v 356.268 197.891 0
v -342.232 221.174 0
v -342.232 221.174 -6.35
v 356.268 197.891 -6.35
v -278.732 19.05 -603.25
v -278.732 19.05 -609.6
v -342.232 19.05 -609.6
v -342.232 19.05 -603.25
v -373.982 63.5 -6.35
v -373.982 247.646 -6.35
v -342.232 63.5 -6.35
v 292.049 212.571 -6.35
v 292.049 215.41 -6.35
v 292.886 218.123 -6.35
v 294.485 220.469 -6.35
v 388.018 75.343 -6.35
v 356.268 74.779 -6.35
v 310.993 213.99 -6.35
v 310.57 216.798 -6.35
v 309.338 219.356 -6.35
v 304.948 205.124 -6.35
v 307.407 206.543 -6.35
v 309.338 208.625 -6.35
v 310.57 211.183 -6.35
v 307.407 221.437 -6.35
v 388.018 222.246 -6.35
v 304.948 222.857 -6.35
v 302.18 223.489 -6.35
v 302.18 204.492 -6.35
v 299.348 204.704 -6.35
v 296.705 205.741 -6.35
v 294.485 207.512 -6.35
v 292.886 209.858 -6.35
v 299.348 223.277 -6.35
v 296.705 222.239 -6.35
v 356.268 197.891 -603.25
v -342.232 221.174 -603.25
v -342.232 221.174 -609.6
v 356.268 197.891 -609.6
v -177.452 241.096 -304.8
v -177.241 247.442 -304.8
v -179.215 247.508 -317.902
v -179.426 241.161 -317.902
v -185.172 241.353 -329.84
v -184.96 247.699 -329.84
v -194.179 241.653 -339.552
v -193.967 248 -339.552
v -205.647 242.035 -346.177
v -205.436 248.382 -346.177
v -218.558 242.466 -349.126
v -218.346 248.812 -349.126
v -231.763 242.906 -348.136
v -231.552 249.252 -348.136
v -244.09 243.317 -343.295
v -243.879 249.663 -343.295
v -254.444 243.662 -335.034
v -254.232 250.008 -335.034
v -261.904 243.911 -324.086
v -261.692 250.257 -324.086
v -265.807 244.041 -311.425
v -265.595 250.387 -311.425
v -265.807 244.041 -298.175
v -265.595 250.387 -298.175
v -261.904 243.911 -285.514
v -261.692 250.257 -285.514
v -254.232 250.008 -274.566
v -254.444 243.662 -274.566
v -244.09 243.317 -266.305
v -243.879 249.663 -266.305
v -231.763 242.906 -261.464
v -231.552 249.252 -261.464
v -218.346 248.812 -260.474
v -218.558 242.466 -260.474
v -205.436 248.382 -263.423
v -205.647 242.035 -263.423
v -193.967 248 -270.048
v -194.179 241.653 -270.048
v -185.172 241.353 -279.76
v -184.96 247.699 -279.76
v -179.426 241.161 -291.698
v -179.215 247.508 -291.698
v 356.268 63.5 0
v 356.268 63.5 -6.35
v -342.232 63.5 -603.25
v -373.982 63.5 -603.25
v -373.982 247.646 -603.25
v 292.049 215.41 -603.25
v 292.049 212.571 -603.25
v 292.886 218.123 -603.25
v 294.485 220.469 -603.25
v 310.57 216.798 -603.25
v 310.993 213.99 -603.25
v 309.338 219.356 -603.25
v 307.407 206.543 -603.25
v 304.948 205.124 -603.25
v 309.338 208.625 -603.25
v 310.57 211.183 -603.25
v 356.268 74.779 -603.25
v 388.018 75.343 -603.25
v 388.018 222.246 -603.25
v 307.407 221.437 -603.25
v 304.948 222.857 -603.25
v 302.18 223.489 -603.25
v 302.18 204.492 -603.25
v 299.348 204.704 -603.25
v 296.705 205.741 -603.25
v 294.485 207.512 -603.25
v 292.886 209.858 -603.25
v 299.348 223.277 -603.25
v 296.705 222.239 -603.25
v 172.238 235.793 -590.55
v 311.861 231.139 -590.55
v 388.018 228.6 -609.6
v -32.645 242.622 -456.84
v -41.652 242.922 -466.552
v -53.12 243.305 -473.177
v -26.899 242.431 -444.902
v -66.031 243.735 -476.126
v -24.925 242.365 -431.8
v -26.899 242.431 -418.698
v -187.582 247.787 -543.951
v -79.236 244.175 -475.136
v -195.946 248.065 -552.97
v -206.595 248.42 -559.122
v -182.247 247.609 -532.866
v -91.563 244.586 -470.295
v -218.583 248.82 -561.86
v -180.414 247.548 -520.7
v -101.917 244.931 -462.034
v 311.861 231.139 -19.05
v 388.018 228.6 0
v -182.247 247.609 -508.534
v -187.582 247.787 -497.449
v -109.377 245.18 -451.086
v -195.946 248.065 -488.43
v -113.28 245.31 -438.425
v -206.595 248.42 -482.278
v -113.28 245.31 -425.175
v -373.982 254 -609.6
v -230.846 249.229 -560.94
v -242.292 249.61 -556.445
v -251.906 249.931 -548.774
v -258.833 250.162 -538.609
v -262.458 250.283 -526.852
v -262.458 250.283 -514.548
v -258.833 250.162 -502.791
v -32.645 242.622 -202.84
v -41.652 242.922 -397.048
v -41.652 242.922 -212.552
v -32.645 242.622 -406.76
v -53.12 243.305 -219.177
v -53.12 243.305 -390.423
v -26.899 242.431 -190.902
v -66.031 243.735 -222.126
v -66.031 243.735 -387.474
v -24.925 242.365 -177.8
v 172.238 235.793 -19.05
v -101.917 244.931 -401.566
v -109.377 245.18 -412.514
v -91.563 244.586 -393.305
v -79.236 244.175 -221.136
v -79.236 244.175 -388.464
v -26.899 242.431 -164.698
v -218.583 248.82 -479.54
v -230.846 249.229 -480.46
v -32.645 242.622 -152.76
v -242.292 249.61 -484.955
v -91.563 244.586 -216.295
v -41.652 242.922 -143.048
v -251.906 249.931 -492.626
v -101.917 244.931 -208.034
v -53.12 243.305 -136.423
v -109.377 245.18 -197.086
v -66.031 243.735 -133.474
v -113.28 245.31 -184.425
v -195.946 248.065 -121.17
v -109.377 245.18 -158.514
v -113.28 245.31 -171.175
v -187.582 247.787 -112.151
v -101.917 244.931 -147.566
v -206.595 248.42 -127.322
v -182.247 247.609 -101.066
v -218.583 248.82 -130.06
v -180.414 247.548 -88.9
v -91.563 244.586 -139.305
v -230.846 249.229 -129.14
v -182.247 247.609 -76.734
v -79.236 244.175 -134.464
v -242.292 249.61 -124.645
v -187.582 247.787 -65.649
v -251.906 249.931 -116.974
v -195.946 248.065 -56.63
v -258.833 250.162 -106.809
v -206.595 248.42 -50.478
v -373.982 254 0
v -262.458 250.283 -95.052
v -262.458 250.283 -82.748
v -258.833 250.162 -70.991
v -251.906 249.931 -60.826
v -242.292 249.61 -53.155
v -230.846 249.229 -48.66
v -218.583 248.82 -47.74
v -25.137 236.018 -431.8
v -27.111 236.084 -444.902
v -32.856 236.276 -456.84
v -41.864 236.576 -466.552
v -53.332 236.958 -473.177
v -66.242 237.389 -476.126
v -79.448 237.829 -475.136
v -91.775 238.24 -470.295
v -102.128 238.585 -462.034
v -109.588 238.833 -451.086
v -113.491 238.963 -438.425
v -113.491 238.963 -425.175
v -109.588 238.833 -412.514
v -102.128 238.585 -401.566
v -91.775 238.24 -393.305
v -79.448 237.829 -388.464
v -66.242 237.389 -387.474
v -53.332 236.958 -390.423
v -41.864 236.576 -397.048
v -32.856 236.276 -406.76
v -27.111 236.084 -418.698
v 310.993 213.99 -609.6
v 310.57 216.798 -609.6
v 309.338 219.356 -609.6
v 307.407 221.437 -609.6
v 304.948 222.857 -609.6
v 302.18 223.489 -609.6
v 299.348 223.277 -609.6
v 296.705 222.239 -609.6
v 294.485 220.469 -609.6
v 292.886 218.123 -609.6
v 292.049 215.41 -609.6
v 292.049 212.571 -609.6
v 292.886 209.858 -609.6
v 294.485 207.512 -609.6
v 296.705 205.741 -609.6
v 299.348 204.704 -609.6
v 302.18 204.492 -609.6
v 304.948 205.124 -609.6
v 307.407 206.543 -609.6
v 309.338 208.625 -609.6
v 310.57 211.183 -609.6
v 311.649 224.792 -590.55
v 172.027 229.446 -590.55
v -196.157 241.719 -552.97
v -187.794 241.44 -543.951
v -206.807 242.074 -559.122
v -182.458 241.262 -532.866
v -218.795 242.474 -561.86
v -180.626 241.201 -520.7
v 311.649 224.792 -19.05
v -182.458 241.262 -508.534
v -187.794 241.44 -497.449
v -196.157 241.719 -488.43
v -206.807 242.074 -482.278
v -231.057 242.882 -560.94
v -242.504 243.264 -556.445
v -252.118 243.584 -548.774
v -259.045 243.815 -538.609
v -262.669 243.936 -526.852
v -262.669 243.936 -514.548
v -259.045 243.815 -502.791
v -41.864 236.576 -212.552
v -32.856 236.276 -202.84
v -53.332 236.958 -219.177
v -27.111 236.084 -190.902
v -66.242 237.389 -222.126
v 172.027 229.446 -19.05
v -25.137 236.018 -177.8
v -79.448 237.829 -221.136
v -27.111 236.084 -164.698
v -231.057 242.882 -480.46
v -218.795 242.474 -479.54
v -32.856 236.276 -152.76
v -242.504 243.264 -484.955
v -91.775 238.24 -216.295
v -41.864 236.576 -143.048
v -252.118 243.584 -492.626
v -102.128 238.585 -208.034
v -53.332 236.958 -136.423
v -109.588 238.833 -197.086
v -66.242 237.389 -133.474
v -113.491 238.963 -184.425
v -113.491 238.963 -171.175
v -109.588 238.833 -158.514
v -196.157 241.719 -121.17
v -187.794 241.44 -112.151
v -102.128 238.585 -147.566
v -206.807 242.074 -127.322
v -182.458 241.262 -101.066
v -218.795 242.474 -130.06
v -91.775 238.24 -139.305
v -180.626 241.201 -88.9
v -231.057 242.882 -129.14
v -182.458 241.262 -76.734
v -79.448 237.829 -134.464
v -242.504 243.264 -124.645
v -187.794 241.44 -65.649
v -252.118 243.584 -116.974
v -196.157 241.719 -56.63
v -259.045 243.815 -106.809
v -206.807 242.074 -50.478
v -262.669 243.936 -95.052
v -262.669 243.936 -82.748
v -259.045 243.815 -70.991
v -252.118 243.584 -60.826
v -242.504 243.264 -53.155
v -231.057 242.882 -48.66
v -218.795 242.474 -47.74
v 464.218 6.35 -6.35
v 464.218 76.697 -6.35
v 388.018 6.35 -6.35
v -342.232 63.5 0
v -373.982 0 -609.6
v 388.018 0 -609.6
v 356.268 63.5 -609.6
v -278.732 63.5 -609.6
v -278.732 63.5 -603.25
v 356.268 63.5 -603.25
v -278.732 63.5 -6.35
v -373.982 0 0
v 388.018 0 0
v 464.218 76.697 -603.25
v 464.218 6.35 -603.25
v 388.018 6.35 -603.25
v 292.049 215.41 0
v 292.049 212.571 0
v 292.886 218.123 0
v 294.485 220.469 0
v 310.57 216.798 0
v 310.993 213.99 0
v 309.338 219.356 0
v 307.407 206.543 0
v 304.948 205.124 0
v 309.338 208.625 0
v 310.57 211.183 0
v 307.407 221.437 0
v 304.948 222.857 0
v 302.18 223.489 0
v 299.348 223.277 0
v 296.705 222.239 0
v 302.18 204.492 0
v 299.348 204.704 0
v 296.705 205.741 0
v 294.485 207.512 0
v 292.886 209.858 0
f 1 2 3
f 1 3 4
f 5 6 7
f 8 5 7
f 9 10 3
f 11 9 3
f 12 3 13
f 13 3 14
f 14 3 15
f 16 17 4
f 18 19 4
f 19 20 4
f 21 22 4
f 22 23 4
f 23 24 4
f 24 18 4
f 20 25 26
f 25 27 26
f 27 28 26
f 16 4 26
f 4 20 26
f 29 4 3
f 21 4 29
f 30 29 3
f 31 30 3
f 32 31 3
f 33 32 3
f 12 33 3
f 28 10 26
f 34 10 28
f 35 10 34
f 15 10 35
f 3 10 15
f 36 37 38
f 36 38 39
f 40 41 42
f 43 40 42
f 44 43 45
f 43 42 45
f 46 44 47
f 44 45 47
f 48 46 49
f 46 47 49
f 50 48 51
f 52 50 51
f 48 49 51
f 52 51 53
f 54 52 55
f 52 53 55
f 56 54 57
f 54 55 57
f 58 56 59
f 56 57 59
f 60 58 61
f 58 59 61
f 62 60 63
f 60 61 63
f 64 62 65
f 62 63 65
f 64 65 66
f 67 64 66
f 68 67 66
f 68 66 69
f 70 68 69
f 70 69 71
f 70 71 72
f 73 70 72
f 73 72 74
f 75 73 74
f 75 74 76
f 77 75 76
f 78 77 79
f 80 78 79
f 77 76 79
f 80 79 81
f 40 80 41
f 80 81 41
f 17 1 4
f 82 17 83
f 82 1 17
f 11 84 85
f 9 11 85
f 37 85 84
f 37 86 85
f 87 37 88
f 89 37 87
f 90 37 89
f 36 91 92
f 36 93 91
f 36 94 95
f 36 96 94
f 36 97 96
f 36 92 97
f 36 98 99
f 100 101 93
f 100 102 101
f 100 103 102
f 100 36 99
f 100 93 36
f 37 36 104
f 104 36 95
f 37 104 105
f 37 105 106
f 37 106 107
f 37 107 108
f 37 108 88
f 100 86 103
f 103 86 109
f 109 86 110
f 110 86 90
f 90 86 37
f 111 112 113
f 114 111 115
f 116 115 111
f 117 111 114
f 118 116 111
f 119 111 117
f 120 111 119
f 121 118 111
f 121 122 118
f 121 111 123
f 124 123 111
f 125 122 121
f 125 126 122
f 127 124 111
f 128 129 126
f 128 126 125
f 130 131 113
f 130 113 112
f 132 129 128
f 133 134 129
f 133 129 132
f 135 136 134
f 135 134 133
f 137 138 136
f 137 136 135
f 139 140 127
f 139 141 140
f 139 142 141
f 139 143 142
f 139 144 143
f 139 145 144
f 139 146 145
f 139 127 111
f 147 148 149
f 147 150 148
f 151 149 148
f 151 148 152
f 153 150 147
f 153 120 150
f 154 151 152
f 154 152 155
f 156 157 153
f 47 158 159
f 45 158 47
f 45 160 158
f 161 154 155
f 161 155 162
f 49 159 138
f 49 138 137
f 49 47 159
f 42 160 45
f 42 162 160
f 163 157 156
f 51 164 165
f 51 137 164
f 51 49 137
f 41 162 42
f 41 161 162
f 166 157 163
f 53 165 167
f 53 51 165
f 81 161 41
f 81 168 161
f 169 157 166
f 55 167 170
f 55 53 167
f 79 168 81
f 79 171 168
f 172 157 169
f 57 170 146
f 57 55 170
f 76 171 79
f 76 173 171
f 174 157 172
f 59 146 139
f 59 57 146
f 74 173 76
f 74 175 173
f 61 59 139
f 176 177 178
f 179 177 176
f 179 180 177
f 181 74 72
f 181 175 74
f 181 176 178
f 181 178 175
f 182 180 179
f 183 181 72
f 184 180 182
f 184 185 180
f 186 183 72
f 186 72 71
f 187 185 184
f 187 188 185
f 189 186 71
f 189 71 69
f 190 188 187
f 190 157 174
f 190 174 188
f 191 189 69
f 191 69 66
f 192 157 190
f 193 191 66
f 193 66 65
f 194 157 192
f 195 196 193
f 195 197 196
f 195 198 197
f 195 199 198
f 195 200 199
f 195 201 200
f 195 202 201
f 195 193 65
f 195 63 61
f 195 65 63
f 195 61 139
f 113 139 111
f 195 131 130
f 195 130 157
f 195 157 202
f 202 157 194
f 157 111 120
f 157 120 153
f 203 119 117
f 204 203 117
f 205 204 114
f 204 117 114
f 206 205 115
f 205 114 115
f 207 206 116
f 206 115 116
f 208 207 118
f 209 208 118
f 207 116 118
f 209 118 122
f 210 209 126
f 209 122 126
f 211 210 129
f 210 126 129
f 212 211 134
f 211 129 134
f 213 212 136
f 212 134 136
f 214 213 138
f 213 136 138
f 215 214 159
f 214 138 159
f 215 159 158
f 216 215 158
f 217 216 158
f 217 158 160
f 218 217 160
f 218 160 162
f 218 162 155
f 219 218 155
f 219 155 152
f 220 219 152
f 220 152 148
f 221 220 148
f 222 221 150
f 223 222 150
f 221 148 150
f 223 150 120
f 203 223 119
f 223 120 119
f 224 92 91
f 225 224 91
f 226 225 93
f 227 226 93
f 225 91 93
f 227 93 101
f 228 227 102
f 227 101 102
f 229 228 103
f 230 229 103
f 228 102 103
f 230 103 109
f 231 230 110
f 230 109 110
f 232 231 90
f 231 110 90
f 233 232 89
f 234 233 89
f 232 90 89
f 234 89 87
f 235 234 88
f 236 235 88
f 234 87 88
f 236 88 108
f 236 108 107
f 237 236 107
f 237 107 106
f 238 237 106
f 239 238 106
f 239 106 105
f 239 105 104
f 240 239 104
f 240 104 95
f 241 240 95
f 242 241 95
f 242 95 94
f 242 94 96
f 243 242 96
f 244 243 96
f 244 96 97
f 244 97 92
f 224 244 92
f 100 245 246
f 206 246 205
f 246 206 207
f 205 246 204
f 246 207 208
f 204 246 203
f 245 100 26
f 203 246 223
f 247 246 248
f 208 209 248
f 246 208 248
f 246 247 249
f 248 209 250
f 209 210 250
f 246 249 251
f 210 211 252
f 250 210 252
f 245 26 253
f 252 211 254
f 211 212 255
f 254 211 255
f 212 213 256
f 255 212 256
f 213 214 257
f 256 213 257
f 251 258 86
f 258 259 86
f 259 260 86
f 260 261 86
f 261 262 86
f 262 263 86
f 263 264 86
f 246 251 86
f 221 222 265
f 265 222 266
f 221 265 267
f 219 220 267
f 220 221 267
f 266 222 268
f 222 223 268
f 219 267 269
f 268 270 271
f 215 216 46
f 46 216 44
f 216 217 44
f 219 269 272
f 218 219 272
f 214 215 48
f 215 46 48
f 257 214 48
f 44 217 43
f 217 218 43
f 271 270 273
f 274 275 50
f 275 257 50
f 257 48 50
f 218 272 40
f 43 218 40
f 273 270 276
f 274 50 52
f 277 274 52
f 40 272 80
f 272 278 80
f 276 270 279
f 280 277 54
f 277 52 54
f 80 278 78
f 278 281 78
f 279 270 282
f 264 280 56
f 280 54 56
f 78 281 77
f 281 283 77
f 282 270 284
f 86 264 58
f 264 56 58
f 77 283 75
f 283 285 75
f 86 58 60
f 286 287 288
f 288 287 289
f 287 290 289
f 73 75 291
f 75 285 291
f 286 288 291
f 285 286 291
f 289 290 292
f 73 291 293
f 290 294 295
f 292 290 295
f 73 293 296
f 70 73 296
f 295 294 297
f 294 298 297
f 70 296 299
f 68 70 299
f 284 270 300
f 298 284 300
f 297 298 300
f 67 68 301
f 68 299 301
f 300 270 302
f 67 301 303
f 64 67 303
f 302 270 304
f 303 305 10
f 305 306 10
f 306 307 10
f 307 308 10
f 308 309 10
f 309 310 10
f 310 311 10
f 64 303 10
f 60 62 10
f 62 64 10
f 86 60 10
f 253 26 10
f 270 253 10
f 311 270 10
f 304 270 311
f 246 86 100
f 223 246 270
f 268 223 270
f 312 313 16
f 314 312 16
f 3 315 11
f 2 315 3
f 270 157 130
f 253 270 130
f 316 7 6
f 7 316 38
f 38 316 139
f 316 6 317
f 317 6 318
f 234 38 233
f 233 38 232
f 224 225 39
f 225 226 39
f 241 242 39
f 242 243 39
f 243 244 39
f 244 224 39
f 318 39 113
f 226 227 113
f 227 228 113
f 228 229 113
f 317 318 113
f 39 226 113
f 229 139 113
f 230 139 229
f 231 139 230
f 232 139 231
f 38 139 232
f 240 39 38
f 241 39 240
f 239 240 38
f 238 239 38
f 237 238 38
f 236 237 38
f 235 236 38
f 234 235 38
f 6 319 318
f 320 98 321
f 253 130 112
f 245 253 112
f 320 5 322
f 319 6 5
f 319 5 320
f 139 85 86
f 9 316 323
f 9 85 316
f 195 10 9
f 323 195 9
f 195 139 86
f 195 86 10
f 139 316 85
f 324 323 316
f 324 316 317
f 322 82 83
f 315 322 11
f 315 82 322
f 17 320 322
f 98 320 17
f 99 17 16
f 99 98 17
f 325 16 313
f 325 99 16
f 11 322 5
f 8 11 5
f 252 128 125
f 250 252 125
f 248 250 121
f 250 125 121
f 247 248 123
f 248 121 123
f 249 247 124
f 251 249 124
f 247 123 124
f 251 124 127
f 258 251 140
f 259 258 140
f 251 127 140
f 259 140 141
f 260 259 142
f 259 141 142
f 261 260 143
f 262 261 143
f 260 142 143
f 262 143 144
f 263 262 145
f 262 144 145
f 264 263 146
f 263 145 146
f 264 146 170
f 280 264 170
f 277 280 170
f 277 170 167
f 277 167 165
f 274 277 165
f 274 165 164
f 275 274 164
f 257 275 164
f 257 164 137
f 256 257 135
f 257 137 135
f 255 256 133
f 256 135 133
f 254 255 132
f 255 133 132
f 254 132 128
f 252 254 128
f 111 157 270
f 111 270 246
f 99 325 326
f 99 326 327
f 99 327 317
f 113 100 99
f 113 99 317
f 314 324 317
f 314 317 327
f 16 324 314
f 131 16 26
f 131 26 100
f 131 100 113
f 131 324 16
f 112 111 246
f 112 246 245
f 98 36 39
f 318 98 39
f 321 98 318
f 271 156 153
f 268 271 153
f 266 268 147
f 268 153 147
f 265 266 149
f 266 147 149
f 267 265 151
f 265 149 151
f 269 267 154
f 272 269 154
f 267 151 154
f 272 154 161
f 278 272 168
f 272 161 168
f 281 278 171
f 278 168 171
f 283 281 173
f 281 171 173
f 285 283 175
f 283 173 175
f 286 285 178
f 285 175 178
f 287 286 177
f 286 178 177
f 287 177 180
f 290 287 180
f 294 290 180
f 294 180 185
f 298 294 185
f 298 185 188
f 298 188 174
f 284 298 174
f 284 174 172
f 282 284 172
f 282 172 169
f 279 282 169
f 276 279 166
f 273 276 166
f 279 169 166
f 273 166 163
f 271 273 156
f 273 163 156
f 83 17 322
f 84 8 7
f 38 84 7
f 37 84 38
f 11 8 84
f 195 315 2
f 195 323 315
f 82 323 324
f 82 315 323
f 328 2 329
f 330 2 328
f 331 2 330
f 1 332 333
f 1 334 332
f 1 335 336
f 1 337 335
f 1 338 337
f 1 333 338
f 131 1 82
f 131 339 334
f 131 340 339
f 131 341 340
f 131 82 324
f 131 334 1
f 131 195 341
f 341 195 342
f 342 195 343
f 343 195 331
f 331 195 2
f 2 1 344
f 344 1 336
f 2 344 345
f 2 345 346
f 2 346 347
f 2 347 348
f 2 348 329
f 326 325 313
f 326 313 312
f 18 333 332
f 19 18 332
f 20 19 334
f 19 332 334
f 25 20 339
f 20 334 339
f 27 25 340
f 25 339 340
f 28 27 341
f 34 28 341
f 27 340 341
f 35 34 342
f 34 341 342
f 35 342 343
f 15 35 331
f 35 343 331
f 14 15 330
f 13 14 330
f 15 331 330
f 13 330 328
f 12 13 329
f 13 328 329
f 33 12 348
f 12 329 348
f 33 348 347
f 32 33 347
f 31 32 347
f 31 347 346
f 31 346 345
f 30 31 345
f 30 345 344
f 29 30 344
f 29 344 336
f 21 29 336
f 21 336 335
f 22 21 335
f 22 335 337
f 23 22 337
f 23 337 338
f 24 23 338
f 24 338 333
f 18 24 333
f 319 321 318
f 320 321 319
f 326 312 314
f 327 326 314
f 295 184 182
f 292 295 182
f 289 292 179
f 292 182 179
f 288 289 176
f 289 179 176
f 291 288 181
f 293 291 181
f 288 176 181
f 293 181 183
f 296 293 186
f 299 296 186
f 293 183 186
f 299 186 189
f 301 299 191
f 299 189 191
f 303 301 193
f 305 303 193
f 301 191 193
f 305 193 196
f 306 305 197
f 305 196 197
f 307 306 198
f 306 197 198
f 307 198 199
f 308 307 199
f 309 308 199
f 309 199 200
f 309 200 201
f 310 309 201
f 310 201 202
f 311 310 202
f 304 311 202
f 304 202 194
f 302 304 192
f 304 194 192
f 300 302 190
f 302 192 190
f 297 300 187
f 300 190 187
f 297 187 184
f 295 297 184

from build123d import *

# Parameters (mm, degrees)
BOSS_EXTRUDE1_DEPTH = 609.6
SHELL1_T            = -6.35
CUT_EXTRUDE1_DEPTH  = 609.6
BOSS_EXTRUDE3_DEPTH = 596.9
BOSS_EXTRUDE4_DEPTH = 95.25
SKETCH8_W           = 31.75
SKETCH8_H           = 44.45
BOSS_EXTRUDE5_DEPTH = 603.25
SKETCH9_W           = 63.5
SKETCH9_H           = 44.45
CUT_EXTRUDE2_DEPTH  = 6.35
SKETCH10_R          = 41.275
SKETCH10_R_2        = 44.45
CUT_EXTRUDE3_DEPTH  = 6.35
SKETCH12_W          = 139.7
SKETCH12_H          = 571.5
CUT_EXTRUDE4_DEPTH  = 6.35
SKETCH13_R          = 9.525
CUT_EXTRUDE5_DEPTH  = 609.6


with BuildPart() as part:
    # Sketch1 → Boss-Extrude1 (new body)
    with BuildSketch(Plane.XY):
        Polygon((-373.981578947, 0), (388.018421053, 0), (388.018421053, 228.6), (-373.981578947, 254), align=None)
    extrude(amount=-BOSS_EXTRUDE1_DEPTH)

    # Shell1
    shell1_openings = [part.faces().sort_by_distance(p)[0] for p in [
        (-373.981578947, 127, -304.8),
        (388.018421053, 114.3, -304.8),
    ]]
    offset(amount=SHELL1_T, openings=shell1_openings, kind=Kind.INTERSECTION)

    # Sketch2 → Cut-Extrude1 (cut)
    with BuildSketch(Plane.XY):
        Polygon((-342.231578947, 221.174032675), (356.268421053, 197.890699341), (356.268421053, 63.5), (-342.231578947, 63.5), align=None)
    extrude(amount=-CUT_EXTRUDE1_DEPTH, mode=Mode.SUBTRACT)

    # Sketch5 → Boss-Extrude3 (add)
    with BuildSketch(Plane.XY.offset(-603.25)):
        Polygon((-278.731578947, 63.5), (464.218421053, 76.696522884), (464.218421053, 6.35), (-278.731578947, 6.35), align=None)
    extrude(amount=BOSS_EXTRUDE3_DEPTH)

    # Sketch6 → Boss-Extrude4 (add)
    with BuildSketch(Plane.ZY.offset(278.731578947)):
        Polygon((-6.35, 63.5), (-603.25, 19.05), (-603.25, 6.35), (-6.35, 6.35), align=None)
    extrude(amount=BOSS_EXTRUDE4_DEPTH)

    # Sketch8 → Boss-Extrude5 (add)
    with BuildSketch(Plane(origin=(0, 0, -609.6), x_dir=(-1, 0, 0), z_dir=(0, 0, -1))):
        with Locations((358.106578947, 41.275)):
            Rectangle(SKETCH8_W, SKETCH8_H)
    extrude(amount=-BOSS_EXTRUDE5_DEPTH)

    # Sketch9 → Cut-Extrude2 (cut)
    with BuildSketch(Plane(origin=(0, 0, -609.6), x_dir=(-1, 0, 0), z_dir=(0, 0, -1))):
        with Locations((310.481578947, 41.275)):
            Rectangle(SKETCH9_W, SKETCH9_H)
    extrude(amount=-CUT_EXTRUDE2_DEPTH, mode=Mode.SUBTRACT)

    # Sketch10 → Cut-Extrude3 (cut)
    with BuildSketch(Plane(origin=(8.042195806, 241.265874175, 0), x_dir=(0.999444907, -0.03331483, 0), z_dir=(0.03331483, 0.999444907, 0))):
        with Locations((-229.835951262, 88.9)):
            Circle(SKETCH10_R)
        with Locations((-229.835951262, 520.7)):
            Circle(SKETCH10_R)
        with Locations((-77.435951262, 431.8)):
            Circle(SKETCH10_R_2)
        with Locations((-77.435951262, 177.8)):
            Circle(SKETCH10_R_2)
        with Locations((-229.835951262, 304.8)):
            Circle(SKETCH10_R_2)
    extrude(amount=-CUT_EXTRUDE3_DEPTH, mode=Mode.SUBTRACT)

    # Sketch12 → Cut-Extrude4 (cut)
    with BuildSketch(Plane(origin=(8.042195806, 241.265874175, 0), x_dir=(0.999444907, -0.03331483, 0), z_dir=(0.03331483, 0.999444907, 0))):
        with Locations((234.137264544, 304.8)):
            Rectangle(SKETCH12_W, SKETCH12_H)
    extrude(amount=-CUT_EXTRUDE4_DEPTH, mode=Mode.SUBTRACT)

    # Sketch13 → Cut-Extrude5 (cut)
    with BuildSketch(Plane.XY):
        with Locations((301.467767378, 213.990365252)):
            Circle(SKETCH13_R)
    extrude(amount=-CUT_EXTRUDE5_DEPTH, mode=Mode.SUBTRACT)


solid = part.part
